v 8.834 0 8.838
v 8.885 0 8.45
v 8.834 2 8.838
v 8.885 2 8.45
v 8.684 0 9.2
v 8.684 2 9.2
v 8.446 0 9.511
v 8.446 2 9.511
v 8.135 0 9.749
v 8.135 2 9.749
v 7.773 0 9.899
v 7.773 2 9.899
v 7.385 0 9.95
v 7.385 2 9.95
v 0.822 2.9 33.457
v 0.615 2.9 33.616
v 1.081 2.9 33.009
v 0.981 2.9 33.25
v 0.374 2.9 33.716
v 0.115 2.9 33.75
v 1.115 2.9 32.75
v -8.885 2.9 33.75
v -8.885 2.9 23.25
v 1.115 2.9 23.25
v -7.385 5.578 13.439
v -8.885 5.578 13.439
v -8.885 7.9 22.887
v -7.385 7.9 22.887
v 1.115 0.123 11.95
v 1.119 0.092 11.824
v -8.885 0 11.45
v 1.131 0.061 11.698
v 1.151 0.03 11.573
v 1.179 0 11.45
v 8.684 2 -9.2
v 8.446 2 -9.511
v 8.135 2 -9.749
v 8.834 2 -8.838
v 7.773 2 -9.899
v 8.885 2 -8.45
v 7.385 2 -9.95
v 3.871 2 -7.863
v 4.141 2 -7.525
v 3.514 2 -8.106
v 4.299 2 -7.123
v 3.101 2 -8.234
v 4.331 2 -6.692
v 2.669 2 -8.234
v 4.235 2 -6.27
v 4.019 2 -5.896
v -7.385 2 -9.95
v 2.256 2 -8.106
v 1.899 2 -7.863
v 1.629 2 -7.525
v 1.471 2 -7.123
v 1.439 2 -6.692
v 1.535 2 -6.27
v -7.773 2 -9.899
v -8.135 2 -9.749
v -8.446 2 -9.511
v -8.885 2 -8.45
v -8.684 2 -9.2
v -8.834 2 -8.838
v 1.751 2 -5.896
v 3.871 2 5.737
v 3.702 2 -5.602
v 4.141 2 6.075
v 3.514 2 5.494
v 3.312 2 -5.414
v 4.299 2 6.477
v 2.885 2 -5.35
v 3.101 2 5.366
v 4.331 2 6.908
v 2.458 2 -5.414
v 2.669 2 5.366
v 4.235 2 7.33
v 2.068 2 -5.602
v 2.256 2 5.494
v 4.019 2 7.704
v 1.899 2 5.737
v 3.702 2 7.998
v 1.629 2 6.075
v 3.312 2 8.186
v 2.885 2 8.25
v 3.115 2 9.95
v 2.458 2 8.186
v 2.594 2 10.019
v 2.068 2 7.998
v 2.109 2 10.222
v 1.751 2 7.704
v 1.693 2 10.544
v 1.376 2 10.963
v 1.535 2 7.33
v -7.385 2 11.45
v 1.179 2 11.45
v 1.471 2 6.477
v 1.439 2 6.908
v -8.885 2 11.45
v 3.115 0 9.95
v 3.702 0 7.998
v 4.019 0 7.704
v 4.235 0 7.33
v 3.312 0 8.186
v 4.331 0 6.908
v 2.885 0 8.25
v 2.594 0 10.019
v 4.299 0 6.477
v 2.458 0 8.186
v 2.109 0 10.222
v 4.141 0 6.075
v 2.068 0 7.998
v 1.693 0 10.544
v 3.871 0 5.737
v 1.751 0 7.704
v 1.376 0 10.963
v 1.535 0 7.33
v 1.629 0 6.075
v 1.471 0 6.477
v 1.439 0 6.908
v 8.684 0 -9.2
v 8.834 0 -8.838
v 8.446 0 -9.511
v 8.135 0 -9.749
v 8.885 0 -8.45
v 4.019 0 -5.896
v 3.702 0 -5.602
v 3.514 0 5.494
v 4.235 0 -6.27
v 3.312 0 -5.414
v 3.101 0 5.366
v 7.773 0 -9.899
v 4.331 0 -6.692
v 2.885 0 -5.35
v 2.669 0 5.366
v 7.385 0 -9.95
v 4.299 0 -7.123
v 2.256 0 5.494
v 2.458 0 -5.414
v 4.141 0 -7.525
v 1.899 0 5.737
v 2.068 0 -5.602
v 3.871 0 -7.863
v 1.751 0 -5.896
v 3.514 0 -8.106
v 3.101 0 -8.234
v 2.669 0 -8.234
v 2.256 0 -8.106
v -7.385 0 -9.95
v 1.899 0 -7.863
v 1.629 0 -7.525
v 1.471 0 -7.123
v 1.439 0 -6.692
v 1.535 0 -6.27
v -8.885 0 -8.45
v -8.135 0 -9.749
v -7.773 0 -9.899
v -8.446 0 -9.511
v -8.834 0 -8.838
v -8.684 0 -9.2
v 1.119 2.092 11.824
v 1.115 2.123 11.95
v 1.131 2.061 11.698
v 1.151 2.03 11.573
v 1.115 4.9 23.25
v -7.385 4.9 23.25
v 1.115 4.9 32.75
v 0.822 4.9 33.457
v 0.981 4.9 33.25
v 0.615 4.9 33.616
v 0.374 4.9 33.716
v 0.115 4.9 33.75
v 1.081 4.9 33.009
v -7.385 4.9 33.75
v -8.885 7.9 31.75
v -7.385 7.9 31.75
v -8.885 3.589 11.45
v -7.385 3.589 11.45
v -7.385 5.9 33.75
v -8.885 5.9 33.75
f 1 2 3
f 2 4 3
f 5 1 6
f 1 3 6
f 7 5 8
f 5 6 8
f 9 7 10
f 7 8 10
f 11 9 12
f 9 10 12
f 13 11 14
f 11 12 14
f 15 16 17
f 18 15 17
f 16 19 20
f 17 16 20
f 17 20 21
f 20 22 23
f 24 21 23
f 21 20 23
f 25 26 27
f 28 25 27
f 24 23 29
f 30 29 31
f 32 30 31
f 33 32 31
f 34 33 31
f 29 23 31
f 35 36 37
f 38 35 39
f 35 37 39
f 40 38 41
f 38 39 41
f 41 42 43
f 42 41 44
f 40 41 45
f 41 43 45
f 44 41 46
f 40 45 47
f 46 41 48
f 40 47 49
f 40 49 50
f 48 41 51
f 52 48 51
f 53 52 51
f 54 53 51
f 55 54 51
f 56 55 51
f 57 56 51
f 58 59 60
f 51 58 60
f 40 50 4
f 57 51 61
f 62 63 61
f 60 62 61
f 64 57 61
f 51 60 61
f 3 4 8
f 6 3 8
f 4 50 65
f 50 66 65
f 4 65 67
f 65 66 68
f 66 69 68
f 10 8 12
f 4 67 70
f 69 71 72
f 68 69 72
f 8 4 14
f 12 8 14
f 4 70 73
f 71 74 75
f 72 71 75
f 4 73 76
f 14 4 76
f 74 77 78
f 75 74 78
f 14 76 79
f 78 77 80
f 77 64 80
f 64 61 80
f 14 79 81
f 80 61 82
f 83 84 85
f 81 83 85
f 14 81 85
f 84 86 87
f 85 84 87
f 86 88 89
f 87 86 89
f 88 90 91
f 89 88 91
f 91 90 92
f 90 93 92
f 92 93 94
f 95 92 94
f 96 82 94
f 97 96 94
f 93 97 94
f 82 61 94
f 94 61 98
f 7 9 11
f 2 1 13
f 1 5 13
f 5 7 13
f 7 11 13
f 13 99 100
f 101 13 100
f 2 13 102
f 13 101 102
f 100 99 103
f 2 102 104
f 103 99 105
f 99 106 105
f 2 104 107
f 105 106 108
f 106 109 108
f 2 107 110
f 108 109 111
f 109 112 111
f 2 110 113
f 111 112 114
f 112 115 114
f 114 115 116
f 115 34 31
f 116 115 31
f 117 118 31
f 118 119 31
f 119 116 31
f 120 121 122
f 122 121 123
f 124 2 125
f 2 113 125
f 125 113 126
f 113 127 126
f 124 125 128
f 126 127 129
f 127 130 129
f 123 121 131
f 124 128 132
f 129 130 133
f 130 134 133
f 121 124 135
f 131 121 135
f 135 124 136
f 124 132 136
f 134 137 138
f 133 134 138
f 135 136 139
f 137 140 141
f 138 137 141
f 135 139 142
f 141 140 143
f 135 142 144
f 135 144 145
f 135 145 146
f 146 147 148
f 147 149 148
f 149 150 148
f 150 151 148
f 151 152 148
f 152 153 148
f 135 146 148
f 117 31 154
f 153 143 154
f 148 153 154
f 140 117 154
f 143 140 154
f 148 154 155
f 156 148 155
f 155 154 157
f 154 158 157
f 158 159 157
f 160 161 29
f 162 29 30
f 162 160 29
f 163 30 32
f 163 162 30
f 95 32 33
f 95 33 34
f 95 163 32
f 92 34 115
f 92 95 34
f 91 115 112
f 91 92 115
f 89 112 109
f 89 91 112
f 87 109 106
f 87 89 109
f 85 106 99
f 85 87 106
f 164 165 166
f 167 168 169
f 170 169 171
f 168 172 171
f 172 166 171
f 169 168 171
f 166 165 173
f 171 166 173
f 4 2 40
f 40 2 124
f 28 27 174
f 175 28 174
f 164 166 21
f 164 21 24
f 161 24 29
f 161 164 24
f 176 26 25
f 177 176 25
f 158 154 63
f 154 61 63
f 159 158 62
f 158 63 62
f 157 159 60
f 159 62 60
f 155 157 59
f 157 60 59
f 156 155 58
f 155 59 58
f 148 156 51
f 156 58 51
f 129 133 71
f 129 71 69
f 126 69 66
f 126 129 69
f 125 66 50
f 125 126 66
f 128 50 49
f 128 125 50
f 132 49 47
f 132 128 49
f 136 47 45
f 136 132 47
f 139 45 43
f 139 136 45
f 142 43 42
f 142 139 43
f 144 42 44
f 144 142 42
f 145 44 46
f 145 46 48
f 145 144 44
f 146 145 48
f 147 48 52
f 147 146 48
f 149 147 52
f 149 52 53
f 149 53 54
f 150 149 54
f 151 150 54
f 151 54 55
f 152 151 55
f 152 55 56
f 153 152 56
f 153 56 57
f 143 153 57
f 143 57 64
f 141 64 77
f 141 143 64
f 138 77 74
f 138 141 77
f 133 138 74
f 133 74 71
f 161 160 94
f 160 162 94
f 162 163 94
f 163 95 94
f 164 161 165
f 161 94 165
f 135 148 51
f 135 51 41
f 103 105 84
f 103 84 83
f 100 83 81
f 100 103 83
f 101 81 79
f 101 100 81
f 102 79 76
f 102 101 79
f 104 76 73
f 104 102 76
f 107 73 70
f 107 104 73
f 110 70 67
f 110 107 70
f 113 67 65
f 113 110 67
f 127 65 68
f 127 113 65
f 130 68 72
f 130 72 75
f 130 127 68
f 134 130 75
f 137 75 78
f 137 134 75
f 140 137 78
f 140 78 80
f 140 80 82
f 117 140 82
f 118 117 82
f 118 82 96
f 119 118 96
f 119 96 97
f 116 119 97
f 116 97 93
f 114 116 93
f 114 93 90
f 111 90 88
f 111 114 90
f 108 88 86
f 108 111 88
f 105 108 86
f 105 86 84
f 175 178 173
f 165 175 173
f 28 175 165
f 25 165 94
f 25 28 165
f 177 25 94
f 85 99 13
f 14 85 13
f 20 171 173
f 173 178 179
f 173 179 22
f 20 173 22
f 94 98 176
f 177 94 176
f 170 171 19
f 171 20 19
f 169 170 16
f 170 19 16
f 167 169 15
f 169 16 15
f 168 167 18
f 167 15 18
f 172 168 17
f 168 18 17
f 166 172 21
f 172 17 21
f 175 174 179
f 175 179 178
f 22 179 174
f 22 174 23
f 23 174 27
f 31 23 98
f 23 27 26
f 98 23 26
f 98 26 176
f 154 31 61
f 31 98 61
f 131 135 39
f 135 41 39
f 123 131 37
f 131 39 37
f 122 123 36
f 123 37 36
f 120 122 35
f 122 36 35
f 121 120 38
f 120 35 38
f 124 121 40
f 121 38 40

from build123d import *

# Parameters (mm, degrees)
SKETCH1_W           = 17.77
SKETCH1_H           = 19.9
SKETCH1_R           = 1.45
BOSS_EXTRUDE1_DEPTH = 2
BOSS_EXTRUDE2_DEPTH = 10
BOSS_EXTRUDE4_DEPTH = 1.5
CHAMFER1_SIZE       = 2
CHAMFER2_SIZE       = 1.5
CHAMFER2_SIZE2      = 2.047943534
FILLET1_R           = 1.5
FILLET2_R           = 1
FILLET3_R           = 2


with BuildPart() as part:
    # Sketch1 → Boss-Extrude1 (new body)
    with BuildSketch(Plane(origin=(0, 0, 0), x_dir=(1, 0, 0), z_dir=(0, 1, 0))):
        Rectangle(SKETCH1_W, SKETCH1_H)
        with Locations(Location((2.885, 6.8, 0), (0, 0, 270))):
            Circle(SKETCH1_R, mode=Mode.SUBTRACT)
        with Locations(Location((2.885, -6.8, 0), (0, 0, 270))):
            Circle(SKETCH1_R, mode=Mode.SUBTRACT)
    extrude(amount=BOSS_EXTRUDE1_DEPTH)

    # Sketch2 → Boss-Extrude2 (add)
    with BuildSketch(Plane.ZY.offset(8.885)):
        Polygon((9.95, 2), (11.45, 2), (23.25, 4.9), (33.75, 4.9), (33.75, 2.9), (23.25, 2.9), (11.45, 0), (9.95, 0), align=None)
    extrude(amount=-BOSS_EXTRUDE2_DEPTH)

    # Sketch4 → Boss-Extrude4 (add)
    with BuildSketch(Plane.ZY.offset(8.885)):
        Polygon((33.75, 4.9), (23.25, 4.9), (11.45, 2), (11.45, 5.089270755), (22.886760378, 7.9), (33.75, 7.9), align=None)
    extrude(amount=-BOSS_EXTRUDE4_DEPTH)

    # Chamfer1
    chamfer1_edges = [part.edges().sort_by_distance(p)[0] for p in [
        (-8.135, 7.9, 33.75),
    ]]
    chamfer(chamfer1_edges, length=CHAMFER1_SIZE)

    # Chamfer2
    chamfer2_edges = [part.edges().sort_by_distance(p)[0] for p in [
        (-8.135, 5.089270755, 11.45),
    ]]
    chamfer2_side = [part.faces().sort_by_distance(p)[0] for p in [
        (-8.135, 3.544635377, 11.45),
    ]]
    chamfer(chamfer2_edges, length=CHAMFER2_SIZE, length2=CHAMFER2_SIZE2, reference=chamfer2_side[0])

    # Fillet1
    fillet1_edges = [part.edges().sort_by_distance(p)[0] for p in [
        (-8.885, 1, -9.95),
        (8.885, 1, -9.95),
        (8.885, 1, 9.95),
    ]]
    fillet(fillet1_edges, radius=FILLET1_R)

    # Fillet2
    fillet2_edges = [part.edges().sort_by_distance(p)[0] for p in [
        (1.115, 3.9, 33.75),
    ]]
    fillet(fillet2_edges, radius=FILLET2_R)

    # Fillet3
    fillet3_edges = [part.edges().sort_by_distance(p)[0] for p in [
        (1.115, 1, 9.95),
    ]]
    fillet(fillet3_edges, radius=FILLET3_R)


solid = part.part
